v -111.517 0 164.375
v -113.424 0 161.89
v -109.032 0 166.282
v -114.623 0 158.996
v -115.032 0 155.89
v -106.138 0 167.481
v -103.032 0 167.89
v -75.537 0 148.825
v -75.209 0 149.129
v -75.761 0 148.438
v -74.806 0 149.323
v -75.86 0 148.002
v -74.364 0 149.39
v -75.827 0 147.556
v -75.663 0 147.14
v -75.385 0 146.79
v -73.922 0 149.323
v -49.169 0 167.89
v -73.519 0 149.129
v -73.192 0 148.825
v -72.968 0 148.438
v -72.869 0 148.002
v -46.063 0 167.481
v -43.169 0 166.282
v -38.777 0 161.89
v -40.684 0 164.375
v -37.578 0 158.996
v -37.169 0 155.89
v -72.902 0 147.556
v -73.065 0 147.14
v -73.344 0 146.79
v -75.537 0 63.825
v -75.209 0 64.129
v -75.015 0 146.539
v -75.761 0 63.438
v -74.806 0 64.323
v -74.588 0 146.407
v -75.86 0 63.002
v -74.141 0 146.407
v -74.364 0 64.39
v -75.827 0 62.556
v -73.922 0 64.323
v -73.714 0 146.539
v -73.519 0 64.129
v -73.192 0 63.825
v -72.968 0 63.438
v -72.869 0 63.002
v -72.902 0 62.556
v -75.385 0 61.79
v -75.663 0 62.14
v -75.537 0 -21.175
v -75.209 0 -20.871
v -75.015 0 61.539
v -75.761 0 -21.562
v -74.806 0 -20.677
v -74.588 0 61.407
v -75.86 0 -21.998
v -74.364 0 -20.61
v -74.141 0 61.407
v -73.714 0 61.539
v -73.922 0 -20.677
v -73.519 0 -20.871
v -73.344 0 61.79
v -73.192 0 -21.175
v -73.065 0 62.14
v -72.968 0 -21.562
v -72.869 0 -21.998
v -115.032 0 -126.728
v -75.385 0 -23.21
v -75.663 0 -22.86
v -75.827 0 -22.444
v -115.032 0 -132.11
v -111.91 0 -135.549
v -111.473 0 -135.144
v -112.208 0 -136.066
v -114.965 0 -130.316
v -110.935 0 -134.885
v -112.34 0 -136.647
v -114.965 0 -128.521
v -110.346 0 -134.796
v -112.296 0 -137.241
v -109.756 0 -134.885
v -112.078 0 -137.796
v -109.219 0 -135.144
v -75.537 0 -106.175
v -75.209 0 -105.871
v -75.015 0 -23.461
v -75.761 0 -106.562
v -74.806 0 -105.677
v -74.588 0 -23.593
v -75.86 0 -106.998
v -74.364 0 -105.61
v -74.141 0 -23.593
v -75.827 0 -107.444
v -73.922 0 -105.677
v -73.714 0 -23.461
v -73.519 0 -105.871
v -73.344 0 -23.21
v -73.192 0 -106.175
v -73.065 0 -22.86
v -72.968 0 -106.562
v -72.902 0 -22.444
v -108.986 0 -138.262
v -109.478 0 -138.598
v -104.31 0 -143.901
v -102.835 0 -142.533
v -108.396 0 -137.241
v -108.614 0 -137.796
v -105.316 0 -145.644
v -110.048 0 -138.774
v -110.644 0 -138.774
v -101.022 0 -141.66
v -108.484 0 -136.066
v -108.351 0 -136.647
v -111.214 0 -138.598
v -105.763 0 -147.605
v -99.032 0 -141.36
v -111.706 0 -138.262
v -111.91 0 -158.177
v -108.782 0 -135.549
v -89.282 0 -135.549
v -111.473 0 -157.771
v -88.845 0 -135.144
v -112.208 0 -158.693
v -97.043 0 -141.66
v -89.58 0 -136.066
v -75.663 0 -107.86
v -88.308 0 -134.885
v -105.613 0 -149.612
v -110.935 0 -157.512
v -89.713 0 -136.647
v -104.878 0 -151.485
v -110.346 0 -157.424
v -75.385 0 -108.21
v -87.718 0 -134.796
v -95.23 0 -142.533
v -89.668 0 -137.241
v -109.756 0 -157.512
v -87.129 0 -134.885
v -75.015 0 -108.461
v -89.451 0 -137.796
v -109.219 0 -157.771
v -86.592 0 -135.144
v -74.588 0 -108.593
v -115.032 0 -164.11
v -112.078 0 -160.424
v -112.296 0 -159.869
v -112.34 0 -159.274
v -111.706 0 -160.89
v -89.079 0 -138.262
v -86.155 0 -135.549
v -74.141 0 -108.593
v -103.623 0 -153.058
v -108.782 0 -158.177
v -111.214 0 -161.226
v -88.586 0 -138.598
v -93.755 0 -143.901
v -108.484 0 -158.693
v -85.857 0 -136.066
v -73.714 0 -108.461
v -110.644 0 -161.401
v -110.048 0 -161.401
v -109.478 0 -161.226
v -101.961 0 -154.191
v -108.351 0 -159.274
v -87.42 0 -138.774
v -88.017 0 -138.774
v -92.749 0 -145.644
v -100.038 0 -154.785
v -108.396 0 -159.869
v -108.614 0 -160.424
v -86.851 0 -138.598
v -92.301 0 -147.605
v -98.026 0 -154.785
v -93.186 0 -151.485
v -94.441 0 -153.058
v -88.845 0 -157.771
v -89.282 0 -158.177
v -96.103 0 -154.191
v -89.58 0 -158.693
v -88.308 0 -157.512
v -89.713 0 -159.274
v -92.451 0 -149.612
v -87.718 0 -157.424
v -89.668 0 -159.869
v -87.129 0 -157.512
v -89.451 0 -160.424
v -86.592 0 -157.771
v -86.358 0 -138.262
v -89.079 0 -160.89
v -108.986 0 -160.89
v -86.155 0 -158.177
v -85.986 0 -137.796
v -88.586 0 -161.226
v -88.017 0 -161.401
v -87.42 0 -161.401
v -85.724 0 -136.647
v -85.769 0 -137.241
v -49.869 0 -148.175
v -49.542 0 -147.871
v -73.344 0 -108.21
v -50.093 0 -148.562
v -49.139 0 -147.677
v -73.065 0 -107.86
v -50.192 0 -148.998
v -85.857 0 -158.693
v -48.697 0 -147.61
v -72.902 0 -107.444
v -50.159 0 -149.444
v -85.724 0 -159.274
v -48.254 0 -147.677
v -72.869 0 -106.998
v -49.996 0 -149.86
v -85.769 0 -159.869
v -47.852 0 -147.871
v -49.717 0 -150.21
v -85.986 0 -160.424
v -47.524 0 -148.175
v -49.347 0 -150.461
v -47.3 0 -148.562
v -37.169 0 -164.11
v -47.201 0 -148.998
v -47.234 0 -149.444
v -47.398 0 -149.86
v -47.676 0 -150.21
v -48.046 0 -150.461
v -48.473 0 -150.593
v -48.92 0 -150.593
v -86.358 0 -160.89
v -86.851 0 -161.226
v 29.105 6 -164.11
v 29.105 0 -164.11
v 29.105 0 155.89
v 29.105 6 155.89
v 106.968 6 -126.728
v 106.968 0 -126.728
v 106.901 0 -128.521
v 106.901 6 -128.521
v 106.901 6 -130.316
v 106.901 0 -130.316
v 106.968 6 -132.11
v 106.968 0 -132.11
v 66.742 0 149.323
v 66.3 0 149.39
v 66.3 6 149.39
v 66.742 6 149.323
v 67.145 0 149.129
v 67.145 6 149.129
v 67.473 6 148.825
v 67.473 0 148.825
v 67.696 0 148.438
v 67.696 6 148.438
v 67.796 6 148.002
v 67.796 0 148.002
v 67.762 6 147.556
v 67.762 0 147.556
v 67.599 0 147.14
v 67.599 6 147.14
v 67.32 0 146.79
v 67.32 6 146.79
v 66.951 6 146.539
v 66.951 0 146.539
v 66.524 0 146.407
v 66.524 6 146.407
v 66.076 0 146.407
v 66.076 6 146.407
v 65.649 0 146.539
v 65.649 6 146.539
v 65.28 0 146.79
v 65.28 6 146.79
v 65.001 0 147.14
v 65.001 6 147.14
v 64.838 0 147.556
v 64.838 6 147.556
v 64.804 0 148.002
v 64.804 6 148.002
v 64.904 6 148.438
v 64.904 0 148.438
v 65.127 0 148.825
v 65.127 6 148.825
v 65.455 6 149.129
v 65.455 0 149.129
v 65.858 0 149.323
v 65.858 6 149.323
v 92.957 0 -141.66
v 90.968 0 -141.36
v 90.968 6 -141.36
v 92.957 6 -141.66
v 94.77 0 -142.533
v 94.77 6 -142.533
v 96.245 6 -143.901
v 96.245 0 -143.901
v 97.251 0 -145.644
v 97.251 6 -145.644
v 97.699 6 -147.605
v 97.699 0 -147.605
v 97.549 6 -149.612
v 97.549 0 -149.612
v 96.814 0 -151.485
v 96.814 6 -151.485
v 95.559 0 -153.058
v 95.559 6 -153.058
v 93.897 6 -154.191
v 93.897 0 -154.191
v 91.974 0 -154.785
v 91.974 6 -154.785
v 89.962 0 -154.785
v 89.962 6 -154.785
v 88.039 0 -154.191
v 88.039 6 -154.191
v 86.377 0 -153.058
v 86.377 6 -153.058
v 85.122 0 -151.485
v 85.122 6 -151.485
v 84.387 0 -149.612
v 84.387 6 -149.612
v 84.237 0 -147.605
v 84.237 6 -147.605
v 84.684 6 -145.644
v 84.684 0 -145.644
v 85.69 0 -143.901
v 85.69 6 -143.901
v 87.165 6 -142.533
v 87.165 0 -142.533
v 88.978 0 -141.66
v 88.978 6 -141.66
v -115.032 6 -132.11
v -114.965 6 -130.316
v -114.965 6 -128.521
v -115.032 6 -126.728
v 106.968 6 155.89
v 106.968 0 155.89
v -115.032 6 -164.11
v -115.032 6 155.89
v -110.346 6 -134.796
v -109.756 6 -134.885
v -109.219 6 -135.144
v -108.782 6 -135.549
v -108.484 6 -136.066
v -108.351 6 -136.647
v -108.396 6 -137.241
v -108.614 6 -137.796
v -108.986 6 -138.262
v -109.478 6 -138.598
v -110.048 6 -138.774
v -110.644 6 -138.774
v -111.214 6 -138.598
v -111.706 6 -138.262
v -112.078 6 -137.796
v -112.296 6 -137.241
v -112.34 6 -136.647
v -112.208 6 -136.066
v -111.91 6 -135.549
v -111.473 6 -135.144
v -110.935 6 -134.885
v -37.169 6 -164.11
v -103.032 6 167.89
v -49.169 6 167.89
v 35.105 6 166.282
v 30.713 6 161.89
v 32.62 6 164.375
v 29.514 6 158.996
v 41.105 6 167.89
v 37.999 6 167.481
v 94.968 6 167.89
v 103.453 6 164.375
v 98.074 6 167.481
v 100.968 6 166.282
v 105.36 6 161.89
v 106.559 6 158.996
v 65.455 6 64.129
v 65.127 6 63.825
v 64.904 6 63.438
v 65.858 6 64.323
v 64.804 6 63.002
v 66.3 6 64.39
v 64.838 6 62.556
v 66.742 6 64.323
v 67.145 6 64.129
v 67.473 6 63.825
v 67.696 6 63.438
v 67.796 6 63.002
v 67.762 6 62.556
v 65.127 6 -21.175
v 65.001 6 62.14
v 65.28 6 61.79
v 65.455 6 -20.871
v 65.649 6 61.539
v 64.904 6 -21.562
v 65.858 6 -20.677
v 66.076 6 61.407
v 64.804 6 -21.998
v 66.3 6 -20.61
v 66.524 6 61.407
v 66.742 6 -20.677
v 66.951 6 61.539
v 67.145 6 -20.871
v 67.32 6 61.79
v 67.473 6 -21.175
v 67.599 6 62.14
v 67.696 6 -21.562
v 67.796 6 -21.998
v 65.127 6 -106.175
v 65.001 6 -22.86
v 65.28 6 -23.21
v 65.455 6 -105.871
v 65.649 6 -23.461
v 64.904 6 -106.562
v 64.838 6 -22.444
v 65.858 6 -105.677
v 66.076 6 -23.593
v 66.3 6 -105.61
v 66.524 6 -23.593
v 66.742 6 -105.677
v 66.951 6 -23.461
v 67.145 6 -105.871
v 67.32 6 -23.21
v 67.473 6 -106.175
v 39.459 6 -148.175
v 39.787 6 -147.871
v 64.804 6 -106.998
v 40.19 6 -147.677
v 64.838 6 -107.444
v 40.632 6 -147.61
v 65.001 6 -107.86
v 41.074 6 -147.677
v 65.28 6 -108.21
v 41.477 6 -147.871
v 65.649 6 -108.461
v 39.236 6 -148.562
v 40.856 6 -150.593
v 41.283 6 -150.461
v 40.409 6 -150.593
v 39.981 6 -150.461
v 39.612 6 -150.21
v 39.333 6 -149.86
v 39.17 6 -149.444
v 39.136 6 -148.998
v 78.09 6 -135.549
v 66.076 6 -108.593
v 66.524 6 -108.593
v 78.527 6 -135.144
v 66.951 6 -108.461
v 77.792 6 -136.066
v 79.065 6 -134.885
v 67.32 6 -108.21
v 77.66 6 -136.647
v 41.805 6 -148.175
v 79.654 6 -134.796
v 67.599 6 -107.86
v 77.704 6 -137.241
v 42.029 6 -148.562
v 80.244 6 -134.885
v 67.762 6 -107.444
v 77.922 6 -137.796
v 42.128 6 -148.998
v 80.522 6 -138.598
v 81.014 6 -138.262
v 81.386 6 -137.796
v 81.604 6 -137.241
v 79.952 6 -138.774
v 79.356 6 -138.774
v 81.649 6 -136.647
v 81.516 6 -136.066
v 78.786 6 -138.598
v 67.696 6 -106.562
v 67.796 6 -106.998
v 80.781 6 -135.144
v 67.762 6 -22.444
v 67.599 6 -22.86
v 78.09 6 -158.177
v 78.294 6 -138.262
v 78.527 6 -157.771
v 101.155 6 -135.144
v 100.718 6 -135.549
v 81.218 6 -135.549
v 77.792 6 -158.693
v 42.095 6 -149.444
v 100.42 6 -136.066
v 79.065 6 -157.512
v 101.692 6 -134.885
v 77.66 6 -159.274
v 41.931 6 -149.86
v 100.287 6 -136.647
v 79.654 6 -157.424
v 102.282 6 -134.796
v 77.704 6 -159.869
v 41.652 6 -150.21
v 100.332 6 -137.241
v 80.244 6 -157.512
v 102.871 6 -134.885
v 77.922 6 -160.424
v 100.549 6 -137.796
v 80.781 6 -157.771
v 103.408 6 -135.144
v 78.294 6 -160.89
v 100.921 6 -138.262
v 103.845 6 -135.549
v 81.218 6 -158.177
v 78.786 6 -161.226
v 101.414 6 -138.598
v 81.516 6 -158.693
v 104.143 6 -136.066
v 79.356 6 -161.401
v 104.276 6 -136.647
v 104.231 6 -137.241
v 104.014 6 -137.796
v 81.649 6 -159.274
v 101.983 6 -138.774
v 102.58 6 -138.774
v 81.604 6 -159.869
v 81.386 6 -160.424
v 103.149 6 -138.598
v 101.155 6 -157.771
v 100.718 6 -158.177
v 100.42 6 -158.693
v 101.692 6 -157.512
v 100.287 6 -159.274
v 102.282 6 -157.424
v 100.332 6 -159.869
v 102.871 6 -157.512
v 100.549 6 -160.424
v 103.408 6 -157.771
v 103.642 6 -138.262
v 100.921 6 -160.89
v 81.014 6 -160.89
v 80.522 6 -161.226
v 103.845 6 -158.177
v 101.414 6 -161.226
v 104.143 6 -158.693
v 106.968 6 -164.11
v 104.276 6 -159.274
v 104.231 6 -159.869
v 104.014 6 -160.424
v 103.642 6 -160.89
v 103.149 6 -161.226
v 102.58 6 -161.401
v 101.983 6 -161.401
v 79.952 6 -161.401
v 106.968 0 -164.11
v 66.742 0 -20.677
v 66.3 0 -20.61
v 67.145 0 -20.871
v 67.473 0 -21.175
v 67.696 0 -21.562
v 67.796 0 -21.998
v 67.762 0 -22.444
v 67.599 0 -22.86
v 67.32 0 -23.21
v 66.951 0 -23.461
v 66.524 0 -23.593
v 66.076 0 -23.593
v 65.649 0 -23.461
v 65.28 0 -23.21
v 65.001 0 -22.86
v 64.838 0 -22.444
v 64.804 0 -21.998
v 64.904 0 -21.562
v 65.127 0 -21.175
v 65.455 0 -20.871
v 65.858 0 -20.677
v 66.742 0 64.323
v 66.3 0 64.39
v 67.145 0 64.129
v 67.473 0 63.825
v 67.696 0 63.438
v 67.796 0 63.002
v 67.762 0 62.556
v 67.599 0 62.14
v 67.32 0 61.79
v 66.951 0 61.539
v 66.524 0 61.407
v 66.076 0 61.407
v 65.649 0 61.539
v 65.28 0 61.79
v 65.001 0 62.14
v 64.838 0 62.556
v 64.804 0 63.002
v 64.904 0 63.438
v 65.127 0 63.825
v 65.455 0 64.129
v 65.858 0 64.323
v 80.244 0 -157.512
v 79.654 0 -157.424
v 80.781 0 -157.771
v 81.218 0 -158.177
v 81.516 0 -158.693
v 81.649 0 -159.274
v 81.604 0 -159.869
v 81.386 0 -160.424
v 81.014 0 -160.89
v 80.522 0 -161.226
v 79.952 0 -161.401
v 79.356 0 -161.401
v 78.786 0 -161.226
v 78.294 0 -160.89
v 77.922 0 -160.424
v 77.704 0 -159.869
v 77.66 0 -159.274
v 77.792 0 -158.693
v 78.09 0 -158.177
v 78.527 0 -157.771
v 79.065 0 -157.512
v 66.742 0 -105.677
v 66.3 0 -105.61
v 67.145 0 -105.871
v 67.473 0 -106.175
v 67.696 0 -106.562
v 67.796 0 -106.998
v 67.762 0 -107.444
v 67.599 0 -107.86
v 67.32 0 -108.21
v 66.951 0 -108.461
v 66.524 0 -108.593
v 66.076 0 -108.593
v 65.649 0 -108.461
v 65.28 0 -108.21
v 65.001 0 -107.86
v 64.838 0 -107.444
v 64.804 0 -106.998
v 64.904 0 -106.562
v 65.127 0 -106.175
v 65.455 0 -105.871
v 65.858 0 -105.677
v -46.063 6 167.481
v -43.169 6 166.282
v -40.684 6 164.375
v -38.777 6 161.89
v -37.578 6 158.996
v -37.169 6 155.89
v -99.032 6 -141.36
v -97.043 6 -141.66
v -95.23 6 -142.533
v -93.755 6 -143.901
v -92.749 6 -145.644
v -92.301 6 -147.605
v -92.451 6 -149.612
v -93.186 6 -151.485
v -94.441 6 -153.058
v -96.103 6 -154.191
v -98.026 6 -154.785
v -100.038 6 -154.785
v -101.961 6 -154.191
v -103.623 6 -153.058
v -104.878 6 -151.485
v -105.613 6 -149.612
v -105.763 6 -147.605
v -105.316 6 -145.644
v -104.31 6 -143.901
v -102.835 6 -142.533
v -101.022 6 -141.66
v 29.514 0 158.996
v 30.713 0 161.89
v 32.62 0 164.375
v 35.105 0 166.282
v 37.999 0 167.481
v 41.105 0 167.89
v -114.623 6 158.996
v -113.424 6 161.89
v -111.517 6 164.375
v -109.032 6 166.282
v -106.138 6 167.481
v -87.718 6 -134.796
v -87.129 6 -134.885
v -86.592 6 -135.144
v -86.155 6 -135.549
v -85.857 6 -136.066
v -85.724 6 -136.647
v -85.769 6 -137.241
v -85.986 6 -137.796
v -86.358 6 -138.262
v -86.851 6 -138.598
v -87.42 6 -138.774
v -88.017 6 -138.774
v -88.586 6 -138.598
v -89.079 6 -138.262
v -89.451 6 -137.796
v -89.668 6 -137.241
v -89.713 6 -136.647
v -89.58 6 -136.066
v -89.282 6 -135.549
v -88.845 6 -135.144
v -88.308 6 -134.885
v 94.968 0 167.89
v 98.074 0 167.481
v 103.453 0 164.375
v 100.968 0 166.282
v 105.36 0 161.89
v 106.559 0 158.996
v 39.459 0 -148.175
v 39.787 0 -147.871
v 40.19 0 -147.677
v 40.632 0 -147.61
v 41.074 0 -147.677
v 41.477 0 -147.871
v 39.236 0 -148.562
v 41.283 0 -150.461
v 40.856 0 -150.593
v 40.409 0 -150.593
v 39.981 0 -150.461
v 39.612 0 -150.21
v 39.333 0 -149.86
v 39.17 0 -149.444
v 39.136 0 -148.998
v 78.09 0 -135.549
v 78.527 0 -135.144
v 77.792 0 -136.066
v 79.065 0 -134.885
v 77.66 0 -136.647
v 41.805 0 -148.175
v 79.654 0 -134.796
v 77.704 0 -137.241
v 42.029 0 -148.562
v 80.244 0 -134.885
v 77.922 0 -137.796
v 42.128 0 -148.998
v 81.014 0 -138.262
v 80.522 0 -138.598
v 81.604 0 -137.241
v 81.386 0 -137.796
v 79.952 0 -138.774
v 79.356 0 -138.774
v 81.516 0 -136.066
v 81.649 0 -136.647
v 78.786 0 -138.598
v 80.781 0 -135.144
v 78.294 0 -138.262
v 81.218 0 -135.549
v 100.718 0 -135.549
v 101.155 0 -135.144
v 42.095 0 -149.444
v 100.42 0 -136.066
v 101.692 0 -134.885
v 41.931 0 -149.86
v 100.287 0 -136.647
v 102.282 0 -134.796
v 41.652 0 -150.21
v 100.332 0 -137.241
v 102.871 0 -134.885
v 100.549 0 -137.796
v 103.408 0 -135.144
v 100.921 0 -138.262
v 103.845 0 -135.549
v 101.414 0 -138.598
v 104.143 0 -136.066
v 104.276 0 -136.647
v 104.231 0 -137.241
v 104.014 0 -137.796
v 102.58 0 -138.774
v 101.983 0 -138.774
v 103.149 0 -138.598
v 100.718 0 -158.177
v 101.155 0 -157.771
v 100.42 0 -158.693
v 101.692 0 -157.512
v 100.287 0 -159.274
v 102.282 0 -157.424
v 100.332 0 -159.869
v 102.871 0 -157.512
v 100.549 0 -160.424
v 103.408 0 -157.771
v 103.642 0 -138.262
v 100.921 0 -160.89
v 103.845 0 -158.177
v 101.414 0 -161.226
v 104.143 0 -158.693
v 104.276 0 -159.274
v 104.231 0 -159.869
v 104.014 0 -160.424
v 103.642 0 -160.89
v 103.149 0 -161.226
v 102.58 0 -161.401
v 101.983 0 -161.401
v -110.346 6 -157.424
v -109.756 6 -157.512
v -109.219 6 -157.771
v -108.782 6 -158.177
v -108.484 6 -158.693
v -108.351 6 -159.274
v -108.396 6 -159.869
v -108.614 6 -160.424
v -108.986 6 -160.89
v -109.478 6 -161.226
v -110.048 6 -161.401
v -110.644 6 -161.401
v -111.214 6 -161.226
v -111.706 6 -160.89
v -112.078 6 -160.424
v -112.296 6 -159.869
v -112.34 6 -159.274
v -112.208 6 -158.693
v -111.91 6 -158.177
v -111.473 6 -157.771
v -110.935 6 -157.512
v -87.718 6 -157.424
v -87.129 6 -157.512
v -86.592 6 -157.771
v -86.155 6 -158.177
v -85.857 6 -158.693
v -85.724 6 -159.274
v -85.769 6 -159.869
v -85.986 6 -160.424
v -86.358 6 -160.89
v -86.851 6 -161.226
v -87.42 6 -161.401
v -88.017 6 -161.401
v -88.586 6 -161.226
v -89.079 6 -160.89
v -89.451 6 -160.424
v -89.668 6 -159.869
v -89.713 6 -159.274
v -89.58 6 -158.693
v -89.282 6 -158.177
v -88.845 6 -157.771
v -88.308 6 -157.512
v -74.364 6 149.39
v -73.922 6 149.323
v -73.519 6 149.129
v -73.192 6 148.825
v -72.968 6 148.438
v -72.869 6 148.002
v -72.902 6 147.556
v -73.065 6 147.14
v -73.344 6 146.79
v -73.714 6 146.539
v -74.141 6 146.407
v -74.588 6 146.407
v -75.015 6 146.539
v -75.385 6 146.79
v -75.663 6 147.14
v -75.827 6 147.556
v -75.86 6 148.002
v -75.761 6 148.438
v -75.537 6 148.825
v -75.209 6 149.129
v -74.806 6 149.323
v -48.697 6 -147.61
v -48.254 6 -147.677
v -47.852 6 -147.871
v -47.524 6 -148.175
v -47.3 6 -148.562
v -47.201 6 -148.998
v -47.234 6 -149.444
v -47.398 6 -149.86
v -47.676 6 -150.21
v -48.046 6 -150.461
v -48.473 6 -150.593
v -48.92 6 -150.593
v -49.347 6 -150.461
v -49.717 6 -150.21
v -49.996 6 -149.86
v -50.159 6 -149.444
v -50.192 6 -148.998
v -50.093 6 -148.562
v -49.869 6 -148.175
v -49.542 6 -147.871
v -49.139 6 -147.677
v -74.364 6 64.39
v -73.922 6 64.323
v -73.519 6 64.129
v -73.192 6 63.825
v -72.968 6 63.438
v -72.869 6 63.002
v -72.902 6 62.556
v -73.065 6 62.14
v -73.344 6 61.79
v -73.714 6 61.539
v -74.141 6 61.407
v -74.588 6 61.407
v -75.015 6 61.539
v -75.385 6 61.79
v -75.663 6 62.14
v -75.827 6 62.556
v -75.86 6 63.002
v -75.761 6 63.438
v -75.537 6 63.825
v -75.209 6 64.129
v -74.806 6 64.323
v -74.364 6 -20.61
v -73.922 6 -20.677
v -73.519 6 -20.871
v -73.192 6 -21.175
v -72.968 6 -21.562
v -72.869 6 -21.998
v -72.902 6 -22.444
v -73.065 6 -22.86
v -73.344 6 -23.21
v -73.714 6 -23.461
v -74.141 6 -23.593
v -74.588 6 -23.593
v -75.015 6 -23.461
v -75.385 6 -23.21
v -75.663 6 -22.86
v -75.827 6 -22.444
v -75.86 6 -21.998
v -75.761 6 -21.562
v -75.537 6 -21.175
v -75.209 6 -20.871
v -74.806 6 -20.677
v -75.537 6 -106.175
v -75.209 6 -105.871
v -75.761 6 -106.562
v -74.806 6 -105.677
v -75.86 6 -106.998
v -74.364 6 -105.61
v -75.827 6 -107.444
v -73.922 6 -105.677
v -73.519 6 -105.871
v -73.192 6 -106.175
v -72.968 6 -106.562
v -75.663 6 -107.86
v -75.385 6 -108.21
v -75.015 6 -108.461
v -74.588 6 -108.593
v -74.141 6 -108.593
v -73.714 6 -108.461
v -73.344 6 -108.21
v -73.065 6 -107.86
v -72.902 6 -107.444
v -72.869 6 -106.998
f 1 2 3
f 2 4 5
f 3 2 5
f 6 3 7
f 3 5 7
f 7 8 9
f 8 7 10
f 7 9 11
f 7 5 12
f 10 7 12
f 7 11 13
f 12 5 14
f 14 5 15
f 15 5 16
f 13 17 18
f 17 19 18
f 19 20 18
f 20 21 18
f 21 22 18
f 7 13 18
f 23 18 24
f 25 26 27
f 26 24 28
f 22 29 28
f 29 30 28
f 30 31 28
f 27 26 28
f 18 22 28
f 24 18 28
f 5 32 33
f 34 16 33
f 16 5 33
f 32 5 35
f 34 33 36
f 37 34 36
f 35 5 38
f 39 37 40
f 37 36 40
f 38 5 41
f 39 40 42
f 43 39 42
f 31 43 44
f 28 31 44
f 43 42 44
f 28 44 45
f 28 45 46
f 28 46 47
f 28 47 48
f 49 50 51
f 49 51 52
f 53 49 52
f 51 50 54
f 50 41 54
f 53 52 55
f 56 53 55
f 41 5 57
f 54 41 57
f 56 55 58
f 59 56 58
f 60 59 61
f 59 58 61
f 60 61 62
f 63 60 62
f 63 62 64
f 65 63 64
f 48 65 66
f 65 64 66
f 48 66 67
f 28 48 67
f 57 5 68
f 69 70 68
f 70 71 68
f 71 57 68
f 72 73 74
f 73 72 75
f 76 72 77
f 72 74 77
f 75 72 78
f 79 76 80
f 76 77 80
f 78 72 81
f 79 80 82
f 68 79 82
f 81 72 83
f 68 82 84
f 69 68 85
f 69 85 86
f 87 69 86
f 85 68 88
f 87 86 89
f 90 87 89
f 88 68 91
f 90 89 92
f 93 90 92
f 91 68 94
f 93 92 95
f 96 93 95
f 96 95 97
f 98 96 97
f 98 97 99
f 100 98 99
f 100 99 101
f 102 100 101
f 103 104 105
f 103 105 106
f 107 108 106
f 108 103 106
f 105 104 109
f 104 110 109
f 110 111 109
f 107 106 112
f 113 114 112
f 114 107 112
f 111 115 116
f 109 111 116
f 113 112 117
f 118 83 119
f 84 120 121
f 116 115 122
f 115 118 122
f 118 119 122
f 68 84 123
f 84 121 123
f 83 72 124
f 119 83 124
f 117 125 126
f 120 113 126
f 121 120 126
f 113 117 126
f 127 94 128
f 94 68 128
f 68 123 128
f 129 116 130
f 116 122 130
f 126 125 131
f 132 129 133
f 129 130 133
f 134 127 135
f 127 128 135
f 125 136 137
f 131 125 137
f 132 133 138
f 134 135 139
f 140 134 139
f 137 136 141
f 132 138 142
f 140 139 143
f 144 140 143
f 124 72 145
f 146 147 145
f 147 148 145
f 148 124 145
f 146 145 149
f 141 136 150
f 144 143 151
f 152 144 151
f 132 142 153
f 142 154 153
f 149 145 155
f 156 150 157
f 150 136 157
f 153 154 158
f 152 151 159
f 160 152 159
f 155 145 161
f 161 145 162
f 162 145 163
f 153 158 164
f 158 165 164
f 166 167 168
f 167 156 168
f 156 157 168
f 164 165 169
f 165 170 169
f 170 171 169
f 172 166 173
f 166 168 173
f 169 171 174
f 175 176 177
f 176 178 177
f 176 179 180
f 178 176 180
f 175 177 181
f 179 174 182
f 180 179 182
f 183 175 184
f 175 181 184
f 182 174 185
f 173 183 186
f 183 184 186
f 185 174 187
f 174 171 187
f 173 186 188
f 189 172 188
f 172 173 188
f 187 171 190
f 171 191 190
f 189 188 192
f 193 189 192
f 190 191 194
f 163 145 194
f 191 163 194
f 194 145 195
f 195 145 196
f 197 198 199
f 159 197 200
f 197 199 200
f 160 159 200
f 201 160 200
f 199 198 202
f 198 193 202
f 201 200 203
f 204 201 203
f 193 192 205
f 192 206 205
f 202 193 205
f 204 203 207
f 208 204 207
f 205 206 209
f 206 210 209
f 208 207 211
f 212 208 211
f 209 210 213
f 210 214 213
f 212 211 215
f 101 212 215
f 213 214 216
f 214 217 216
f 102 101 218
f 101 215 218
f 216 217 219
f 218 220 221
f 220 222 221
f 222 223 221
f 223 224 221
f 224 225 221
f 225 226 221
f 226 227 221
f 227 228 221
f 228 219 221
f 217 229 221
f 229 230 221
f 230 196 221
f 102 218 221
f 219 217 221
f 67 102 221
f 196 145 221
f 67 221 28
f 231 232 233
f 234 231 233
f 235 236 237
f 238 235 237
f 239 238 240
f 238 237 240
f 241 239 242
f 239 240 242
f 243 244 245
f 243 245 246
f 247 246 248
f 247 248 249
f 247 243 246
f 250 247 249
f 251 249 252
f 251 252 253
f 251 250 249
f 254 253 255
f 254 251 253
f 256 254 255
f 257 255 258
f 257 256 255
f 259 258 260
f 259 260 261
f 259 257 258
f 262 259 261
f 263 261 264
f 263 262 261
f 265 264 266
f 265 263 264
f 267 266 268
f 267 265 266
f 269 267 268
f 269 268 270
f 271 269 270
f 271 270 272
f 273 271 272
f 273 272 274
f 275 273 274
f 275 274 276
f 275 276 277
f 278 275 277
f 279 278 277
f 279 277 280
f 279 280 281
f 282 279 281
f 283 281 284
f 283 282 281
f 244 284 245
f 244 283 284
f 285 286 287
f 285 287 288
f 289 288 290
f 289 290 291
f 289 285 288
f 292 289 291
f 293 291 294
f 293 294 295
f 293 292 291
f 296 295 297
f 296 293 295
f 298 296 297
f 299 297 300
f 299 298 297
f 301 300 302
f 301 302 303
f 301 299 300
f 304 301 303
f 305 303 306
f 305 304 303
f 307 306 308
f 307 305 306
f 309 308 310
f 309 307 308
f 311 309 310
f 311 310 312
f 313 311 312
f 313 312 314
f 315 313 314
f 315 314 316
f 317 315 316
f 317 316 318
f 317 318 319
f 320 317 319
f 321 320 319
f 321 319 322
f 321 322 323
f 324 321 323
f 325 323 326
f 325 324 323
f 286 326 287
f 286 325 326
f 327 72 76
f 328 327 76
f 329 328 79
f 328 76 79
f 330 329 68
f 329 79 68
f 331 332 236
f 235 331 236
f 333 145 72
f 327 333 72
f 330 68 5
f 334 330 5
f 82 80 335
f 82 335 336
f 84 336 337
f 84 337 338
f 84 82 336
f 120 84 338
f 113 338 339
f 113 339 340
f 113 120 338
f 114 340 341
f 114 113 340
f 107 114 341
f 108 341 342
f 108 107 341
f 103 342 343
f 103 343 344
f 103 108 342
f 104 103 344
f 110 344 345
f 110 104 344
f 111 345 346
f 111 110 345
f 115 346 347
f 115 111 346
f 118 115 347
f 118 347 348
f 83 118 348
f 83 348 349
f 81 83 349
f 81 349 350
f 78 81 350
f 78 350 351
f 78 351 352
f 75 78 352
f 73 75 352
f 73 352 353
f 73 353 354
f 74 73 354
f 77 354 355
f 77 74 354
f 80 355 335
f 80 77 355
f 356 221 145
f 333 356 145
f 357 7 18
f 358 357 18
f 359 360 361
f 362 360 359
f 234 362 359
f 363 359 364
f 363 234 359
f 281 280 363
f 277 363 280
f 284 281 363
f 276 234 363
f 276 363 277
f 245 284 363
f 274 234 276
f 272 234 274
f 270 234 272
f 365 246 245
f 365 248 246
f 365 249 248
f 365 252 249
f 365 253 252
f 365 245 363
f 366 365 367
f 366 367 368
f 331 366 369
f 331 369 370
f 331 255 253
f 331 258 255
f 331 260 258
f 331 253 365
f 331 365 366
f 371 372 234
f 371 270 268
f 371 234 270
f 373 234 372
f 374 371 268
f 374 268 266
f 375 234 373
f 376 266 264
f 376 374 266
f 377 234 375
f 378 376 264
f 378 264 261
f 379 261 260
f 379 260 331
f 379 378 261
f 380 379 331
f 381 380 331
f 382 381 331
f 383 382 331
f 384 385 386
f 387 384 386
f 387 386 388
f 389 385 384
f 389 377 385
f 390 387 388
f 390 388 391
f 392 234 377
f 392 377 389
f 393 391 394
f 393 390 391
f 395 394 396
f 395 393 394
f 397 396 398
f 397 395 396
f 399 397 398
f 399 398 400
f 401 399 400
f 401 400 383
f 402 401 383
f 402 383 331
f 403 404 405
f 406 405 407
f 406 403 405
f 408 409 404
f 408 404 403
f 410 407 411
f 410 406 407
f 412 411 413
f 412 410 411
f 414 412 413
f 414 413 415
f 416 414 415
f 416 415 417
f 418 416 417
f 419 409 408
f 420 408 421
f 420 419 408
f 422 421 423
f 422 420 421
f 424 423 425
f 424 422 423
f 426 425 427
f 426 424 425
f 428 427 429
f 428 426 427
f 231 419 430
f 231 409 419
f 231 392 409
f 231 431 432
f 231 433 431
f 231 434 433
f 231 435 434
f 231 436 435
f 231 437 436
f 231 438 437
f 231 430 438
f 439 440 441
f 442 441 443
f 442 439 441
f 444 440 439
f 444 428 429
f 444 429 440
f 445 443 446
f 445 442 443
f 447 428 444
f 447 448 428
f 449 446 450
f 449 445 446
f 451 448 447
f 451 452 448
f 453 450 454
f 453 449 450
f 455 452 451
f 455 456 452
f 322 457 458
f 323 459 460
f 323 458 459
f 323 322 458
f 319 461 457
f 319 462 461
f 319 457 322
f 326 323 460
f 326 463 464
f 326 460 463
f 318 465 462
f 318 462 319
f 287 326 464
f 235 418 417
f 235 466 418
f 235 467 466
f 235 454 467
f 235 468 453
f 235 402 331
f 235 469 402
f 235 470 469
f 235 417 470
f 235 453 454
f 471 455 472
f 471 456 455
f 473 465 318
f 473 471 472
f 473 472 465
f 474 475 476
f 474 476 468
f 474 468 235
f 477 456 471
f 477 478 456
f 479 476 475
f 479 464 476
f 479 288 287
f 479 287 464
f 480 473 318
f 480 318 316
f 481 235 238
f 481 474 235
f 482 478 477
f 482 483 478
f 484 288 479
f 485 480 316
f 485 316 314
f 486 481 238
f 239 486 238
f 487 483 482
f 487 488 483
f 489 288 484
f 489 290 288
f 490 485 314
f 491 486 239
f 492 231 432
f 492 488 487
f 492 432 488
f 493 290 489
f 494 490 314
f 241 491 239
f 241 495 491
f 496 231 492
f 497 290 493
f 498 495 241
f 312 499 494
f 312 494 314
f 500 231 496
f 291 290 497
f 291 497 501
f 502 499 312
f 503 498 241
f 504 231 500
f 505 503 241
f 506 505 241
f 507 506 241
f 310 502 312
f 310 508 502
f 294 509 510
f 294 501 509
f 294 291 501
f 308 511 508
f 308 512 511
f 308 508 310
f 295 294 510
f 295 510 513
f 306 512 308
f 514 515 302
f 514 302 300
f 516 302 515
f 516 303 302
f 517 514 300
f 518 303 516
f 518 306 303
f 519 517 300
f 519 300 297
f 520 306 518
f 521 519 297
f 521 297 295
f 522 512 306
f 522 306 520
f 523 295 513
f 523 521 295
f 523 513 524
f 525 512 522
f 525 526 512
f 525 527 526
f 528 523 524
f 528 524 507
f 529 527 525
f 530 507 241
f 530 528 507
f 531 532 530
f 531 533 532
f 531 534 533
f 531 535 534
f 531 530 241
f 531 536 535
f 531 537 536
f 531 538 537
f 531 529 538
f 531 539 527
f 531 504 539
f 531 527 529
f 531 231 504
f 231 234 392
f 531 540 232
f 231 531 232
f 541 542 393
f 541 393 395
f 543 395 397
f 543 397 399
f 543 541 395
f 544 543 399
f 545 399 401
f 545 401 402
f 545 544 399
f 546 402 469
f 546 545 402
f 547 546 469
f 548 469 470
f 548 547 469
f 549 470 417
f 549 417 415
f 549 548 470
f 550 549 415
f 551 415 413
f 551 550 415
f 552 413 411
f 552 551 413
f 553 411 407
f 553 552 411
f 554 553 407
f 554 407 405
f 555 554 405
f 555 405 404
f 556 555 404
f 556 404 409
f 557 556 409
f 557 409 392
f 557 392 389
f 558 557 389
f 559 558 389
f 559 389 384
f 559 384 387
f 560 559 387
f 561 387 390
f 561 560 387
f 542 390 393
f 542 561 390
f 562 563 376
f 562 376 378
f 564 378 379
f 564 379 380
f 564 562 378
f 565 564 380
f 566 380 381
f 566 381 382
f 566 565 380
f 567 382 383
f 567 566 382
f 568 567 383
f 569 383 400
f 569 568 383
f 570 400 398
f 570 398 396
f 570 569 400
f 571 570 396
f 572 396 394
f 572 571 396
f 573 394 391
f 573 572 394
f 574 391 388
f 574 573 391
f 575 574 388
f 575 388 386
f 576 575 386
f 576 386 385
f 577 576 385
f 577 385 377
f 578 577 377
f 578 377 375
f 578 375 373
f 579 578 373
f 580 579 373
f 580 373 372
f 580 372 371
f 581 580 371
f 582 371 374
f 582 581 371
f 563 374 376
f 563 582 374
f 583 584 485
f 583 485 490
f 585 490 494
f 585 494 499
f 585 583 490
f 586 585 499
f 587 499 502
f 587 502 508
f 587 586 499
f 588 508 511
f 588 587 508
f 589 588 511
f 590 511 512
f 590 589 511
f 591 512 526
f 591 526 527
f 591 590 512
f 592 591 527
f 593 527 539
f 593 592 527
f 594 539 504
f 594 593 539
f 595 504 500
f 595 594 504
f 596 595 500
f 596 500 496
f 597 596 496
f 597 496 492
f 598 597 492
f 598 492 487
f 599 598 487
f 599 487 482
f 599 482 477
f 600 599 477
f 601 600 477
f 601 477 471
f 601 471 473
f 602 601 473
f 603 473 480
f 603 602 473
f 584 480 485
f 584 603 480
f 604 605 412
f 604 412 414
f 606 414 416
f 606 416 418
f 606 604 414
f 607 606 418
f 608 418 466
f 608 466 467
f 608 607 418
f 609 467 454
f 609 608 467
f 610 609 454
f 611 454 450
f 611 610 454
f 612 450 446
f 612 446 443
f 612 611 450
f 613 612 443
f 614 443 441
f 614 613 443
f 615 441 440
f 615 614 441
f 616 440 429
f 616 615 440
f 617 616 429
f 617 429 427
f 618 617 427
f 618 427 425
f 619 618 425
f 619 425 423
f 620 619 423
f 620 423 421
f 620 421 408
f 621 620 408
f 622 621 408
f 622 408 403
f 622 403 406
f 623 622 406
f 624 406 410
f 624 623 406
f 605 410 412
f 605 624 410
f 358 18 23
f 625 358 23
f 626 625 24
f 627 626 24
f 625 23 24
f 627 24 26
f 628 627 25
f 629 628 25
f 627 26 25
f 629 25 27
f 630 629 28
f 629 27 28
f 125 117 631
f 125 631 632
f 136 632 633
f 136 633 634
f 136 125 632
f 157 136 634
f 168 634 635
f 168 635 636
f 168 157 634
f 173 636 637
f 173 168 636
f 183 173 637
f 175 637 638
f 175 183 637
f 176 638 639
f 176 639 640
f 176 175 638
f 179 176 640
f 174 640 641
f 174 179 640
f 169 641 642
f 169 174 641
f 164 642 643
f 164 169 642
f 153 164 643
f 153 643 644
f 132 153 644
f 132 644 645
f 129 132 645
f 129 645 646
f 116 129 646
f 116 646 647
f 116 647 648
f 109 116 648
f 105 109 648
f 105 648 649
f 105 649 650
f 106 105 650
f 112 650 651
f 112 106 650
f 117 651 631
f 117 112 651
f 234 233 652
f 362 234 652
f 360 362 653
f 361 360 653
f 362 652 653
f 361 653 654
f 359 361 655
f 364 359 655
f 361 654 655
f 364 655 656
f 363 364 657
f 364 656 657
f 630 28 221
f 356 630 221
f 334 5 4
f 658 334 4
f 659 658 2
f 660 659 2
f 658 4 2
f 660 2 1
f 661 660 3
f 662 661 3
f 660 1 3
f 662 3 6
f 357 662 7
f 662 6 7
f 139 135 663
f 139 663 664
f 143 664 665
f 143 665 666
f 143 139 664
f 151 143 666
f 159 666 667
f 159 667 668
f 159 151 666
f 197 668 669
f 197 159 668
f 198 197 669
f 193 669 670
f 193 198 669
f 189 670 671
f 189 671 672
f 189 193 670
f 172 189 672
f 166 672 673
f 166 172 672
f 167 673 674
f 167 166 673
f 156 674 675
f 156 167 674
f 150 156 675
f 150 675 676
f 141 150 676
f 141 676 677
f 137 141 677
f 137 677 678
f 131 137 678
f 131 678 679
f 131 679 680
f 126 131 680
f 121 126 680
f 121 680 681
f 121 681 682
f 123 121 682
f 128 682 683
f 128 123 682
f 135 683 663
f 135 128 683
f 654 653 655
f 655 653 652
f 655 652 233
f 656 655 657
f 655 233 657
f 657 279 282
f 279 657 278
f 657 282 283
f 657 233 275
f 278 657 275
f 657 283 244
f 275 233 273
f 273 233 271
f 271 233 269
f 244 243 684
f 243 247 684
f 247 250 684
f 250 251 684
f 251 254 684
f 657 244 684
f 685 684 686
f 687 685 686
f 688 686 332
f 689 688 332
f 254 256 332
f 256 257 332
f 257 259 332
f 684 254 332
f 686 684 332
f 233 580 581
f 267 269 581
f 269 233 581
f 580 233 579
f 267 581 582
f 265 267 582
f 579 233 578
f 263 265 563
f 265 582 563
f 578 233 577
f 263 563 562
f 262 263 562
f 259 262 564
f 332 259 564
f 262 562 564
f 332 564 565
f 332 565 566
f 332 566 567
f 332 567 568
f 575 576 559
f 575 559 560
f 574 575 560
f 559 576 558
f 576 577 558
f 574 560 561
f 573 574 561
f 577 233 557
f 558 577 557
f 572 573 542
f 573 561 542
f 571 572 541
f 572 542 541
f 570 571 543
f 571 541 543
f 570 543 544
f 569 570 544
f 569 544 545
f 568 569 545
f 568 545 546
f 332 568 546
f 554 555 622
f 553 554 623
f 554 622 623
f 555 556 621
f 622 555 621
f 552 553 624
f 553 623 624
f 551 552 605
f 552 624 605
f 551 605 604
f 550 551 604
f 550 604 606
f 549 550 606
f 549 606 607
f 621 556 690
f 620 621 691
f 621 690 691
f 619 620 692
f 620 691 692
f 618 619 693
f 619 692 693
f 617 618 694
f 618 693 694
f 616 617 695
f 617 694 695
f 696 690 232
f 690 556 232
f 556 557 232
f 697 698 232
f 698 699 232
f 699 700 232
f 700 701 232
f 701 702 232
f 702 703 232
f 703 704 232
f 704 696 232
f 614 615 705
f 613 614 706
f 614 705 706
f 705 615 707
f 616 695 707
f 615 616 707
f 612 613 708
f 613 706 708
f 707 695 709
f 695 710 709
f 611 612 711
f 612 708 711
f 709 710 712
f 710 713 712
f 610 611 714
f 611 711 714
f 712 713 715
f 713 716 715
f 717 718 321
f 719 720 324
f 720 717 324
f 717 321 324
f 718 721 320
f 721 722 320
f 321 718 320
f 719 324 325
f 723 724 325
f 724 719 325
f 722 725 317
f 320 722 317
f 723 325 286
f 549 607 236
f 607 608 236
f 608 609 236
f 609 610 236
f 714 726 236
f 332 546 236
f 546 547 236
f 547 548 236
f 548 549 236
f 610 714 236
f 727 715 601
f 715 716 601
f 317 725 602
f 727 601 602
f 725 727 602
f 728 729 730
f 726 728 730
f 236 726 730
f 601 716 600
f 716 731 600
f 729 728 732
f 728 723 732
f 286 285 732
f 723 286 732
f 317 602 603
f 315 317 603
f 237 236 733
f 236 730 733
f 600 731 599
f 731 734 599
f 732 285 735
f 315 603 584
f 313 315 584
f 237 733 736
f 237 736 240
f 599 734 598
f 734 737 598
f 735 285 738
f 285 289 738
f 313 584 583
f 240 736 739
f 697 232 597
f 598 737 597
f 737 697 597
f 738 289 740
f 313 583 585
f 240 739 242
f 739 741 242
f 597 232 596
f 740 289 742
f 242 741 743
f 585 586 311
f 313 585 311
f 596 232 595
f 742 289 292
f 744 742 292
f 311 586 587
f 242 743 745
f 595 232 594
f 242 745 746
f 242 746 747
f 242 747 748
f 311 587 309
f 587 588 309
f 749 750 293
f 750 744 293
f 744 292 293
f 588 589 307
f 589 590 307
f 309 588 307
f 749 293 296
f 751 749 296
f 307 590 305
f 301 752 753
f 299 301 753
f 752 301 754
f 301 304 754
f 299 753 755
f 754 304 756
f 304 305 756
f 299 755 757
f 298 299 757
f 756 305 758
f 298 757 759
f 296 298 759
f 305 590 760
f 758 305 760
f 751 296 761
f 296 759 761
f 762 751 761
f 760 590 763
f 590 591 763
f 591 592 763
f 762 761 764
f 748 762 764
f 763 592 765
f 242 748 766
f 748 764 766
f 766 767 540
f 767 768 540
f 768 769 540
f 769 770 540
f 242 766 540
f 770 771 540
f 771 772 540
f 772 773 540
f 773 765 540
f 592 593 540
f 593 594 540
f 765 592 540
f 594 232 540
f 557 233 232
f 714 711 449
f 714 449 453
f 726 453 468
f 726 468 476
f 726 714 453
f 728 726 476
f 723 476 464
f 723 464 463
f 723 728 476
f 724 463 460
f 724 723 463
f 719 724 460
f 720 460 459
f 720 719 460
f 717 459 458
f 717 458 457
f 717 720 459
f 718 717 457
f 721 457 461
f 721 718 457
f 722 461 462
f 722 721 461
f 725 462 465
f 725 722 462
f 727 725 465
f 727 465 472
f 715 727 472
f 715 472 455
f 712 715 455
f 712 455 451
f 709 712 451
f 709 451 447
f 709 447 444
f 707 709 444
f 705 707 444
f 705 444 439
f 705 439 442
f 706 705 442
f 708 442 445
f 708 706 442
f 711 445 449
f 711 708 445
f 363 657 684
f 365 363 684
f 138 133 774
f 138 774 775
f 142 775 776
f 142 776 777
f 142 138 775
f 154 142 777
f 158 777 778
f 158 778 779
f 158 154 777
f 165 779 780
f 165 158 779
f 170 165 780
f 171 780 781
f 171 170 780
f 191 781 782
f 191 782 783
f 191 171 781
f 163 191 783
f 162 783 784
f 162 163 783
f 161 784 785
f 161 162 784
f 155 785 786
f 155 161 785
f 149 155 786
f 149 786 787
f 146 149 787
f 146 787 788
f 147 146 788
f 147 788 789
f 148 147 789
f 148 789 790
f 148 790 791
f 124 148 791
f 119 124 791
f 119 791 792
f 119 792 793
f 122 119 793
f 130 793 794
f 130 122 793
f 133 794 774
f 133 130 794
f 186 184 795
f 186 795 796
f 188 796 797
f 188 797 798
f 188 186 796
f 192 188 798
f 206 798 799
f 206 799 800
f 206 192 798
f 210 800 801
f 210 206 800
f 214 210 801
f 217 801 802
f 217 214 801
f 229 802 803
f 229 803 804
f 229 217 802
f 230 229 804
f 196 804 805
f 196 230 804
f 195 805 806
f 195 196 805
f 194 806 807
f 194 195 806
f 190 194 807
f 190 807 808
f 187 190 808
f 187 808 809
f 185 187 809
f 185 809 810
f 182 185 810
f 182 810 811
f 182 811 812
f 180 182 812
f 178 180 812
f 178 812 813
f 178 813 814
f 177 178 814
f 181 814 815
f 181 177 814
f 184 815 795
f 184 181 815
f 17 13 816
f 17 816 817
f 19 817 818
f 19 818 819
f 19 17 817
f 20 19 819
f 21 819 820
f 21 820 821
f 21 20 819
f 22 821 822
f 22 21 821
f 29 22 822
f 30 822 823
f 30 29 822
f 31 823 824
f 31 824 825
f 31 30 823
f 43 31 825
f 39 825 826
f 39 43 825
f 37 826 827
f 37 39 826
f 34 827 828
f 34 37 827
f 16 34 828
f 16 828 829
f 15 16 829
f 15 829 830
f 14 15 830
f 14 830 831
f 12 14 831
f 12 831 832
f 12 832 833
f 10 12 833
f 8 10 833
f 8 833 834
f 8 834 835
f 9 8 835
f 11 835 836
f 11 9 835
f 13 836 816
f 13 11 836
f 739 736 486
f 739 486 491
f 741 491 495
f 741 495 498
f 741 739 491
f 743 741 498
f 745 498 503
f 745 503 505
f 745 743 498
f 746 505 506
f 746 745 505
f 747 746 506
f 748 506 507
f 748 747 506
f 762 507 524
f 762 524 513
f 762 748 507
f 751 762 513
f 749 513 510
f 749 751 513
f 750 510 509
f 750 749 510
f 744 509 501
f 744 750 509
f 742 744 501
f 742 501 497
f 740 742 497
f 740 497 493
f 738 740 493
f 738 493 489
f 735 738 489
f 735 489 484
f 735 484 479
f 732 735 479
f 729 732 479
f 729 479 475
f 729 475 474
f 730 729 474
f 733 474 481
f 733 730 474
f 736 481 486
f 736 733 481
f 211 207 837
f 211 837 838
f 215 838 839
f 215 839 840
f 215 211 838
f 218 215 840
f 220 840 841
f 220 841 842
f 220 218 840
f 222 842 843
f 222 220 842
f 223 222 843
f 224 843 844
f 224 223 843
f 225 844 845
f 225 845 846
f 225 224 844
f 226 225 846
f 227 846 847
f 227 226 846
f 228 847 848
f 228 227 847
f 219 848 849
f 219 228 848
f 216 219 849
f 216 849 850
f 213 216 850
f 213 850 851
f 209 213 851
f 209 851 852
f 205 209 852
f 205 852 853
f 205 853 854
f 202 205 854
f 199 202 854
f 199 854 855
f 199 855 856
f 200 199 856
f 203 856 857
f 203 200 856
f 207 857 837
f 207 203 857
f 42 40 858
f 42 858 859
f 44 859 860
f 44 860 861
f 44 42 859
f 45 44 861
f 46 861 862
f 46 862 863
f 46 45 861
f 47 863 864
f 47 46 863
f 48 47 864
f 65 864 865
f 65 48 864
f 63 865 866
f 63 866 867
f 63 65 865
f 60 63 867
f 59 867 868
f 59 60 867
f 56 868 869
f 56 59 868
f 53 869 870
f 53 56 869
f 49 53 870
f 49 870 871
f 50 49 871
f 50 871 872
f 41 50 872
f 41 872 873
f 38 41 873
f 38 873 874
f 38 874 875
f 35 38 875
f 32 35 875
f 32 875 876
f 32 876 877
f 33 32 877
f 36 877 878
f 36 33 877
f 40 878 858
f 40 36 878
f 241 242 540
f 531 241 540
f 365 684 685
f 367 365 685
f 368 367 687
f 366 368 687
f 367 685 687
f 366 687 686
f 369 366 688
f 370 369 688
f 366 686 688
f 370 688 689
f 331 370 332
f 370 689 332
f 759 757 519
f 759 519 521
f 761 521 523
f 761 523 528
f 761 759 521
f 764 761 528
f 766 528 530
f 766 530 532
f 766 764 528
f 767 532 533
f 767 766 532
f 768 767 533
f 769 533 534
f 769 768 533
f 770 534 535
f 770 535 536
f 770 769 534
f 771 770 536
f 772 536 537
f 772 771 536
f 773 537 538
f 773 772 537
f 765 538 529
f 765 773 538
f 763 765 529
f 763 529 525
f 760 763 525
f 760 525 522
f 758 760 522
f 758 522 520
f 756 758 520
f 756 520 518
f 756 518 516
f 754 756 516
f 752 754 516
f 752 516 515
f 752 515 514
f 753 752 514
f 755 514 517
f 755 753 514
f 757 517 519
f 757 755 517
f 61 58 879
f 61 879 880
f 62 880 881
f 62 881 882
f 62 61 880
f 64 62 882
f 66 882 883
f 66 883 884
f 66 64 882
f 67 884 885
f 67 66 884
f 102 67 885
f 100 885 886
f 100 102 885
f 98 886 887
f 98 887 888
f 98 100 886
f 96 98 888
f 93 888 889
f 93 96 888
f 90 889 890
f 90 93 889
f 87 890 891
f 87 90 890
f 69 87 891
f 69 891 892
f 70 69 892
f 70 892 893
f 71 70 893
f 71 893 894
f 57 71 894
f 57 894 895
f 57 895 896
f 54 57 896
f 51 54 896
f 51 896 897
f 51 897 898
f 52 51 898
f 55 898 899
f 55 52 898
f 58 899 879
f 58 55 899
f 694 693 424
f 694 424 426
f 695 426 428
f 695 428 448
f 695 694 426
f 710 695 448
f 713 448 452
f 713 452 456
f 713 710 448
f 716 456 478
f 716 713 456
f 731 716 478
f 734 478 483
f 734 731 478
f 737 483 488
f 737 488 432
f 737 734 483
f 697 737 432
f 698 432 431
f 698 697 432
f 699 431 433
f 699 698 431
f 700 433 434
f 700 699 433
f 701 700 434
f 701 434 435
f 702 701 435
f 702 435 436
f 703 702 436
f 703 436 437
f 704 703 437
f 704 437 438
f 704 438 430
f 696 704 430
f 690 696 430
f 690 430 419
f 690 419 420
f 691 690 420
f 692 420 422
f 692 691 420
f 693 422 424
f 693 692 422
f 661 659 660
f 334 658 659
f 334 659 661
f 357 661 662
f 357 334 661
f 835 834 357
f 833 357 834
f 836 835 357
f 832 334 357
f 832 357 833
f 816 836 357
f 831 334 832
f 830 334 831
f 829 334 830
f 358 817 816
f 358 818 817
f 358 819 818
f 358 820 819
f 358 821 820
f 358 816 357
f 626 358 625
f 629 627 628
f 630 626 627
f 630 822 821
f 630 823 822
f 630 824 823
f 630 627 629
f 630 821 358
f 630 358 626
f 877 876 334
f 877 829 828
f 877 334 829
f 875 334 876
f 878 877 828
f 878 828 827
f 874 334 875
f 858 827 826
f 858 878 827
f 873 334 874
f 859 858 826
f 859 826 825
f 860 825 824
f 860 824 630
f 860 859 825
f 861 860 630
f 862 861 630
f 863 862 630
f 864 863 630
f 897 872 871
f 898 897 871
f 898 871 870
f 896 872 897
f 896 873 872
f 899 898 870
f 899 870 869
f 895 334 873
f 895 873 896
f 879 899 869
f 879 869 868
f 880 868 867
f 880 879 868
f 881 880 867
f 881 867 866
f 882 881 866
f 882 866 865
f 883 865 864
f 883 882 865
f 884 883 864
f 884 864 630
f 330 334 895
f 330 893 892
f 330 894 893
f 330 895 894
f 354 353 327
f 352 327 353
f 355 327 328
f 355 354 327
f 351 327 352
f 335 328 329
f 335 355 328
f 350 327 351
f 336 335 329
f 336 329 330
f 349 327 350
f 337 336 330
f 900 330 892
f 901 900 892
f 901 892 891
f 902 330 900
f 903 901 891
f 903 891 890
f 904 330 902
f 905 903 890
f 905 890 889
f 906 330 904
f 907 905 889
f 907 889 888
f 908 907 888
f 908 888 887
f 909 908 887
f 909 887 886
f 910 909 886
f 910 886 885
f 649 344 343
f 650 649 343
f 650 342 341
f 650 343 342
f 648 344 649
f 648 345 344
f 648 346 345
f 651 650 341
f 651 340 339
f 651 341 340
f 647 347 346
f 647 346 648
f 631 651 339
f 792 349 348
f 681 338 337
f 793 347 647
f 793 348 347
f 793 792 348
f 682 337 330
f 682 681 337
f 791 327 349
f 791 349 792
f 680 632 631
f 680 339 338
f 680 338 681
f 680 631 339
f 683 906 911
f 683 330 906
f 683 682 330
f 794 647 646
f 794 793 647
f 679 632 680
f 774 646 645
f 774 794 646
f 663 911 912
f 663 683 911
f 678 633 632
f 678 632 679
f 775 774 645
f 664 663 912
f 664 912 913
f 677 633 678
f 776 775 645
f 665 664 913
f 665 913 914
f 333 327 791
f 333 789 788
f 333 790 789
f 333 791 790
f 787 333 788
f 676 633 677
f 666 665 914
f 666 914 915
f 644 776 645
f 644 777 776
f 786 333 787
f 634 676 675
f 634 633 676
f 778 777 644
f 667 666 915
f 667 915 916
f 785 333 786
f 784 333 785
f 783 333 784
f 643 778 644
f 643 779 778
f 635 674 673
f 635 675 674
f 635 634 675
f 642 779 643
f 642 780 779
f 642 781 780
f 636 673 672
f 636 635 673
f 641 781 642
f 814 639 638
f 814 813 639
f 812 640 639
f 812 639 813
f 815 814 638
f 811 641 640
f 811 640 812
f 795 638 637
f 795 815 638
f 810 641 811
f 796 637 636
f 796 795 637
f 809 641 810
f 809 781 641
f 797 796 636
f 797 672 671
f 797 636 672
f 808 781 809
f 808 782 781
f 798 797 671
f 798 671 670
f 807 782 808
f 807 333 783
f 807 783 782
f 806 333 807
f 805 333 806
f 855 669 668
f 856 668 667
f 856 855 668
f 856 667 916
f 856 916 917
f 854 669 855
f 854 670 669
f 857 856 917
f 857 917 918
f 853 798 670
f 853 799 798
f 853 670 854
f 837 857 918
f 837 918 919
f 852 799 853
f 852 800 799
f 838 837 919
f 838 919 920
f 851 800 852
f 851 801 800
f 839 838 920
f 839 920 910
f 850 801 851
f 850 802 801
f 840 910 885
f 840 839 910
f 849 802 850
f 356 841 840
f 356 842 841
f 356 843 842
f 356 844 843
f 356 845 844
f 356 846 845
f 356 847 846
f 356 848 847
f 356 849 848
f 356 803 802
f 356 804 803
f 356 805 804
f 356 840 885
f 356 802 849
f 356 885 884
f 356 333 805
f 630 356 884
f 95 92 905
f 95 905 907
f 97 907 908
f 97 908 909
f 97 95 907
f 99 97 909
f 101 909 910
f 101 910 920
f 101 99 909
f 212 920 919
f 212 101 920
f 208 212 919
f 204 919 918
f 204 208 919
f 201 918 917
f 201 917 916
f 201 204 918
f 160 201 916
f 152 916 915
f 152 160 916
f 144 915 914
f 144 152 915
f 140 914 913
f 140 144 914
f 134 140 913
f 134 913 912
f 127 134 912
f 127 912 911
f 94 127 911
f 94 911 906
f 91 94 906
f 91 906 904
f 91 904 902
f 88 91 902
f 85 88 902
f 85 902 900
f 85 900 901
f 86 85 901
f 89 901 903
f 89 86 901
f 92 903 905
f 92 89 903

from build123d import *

# Parameters (mm, degrees)
CROQUIS1_R                = 1.5
CROQUIS1_R_2              = 2
CROQUIS1_R_3              = 6.75
SALIENTE_EXTRUIR1_DEPTH   = 6
SALIENTE_EXTRUIR1_2_DEPTH = 6


with BuildPart() as part:
    # Croquis1 → Saliente-Extruir1 (new body)
    with BuildSketch(Plane(origin=(0, 0, 0), x_dir=(1, 0, 0), z_dir=(0, 1, 0))):
        with BuildLine():
            Line((106.967839575, 132.109924801), (106.967839575, 164.109924801))
            Line((106.967839575, 164.109924801), (29.104968861, 164.109924801))
            Line((29.104968861, 164.109924801), (29.104968861, -155.890075199))
            ThreePointArc((29.104968861, -155.890075199), (32.619687487, -164.375356573), (41.104968861, -167.890075199))
            Line((41.104968861, -167.890075199), (94.967839575, -167.890075199))
            ThreePointArc((94.967839575, -167.890075199), (103.45312095, -164.375356573), (106.967839575, -155.890075199))
            Line((106.967839575, -155.890075199), (106.967839575, 126.727593434))
            ThreePointArc((106.967839575, 126.727593434), (106.892367598, 129.418759117), (106.967839575, 132.109924801))
        make_face()
        with Locations(Location((66.300038828, -147.890075199, 0), (0, 0, 270))):
            Circle(CROQUIS1_R, mode=Mode.SUBTRACT)
        with Locations(Location((66.300038828, -62.890075199, 0), (0, 0, 270))):
            Circle(CROQUIS1_R, mode=Mode.SUBTRACT)
        with Locations(Location((66.300038828, 22.109924801, 0), (0, 0, 270))):
            Circle(CROQUIS1_R, mode=Mode.SUBTRACT)
        with Locations(Location((40.63223808, 149.109924801, 0), (0, 0, 270))):
            Circle(CROQUIS1_R, mode=Mode.SUBTRACT)
        with Locations(Location((66.300038828, 107.109924801, 0), (0, 0, 270))):
            Circle(CROQUIS1_R, mode=Mode.SUBTRACT)
        with Locations(Location((79.654131076, 136.796216302, 0), (0, 0, 270))):
            Circle(CROQUIS1_R_2, mode=Mode.SUBTRACT)
        with Locations(Location((102.281548074, 136.796216302, 0), (0, 0, 270))):
            Circle(CROQUIS1_R_2, mode=Mode.SUBTRACT)
        with Locations(Location((90.967839575, 148.109924801, 0), (0, 0, 270))):
            Circle(CROQUIS1_R_3, mode=Mode.SUBTRACT)
        with Locations(Location((79.654131076, 159.4236333, 0), (0, 0, 270))):
            Circle(CROQUIS1_R_2, mode=Mode.SUBTRACT)
        with Locations(Location((102.281548074, 159.4236333, 0), (0, 0, 270))):
            Circle(CROQUIS1_R_2, mode=Mode.SUBTRACT)
    extrude(amount=SALIENTE_EXTRUIR1_DEPTH)


with BuildPart() as body_2:
    # Croquis1 → Saliente-Extruir1 2 (new body)
    with BuildSketch(Plane(origin=(0, 0, 0), x_dir=(1, 0, 0), z_dir=(0, 1, 0))):
        with BuildLine():
            Line((-37.16928971, 164.109924801), (-115.032160425, 164.109924801))
            Line((-115.032160425, 164.109924801), (-115.032160425, 132.109924801))
            ThreePointArc((-115.032160425, 132.109924801), (-114.956688447, 129.418759117), (-115.032160425, 126.727593433))
            Line((-115.032160425, 126.727593433), (-115.032160425, -155.890075199))
            ThreePointArc((-115.032160425, -155.890075199), (-111.517441799, -164.375356573), (-103.032160425, -167.890075199))
            Line((-103.032160425, -167.890075199), (-49.16928971, -167.890075199))
            ThreePointArc((-49.16928971, -167.890075199), (-40.684008336, -164.375356573), (-37.16928971, -155.890075199))
            Line((-37.16928971, -155.890075199), (-37.16928971, 164.109924801))
        make_face()
        with Locations(Location((-74.364359677, -147.890075199, 0), (0, 0, 270))):
            Circle(CROQUIS1_R, mode=Mode.SUBTRACT)
        with Locations(Location((-74.364359677, -62.890075199, 0), (0, 0, 270))):
            Circle(CROQUIS1_R, mode=Mode.SUBTRACT)
        with Locations(Location((-74.364359677, 22.109924801, 0), (0, 0, 270))):
            Circle(CROQUIS1_R, mode=Mode.SUBTRACT)
        with Locations(Location((-74.364359677, 107.109924801, 0), (0, 0, 270))):
            Circle(CROQUIS1_R, mode=Mode.SUBTRACT)
        with Locations(Location((-110.345868924, 136.796216302, 0), (0, 0, 270))):
            Circle(CROQUIS1_R_2, mode=Mode.SUBTRACT)
        with Locations(Location((-87.718451926, 136.796216302, 0), (0, 0, 270))):
            Circle(CROQUIS1_R_2, mode=Mode.SUBTRACT)
        with Locations(Location((-110.345868924, 159.4236333, 0), (0, 0, 270))):
            Circle(CROQUIS1_R_2, mode=Mode.SUBTRACT)
        with Locations(Location((-99.032160425, 148.109924801, 0), (0, 0, 270))):
            Circle(CROQUIS1_R_3, mode=Mode.SUBTRACT)
        with Locations(Location((-87.718451926, 159.4236333, 0), (0, 0, 270))):
            Circle(CROQUIS1_R_2, mode=Mode.SUBTRACT)
        with Locations(Location((-48.696558929, 149.109924801, 0), (0, 0, 270))):
            Circle(CROQUIS1_R, mode=Mode.SUBTRACT)
    extrude(amount=SALIENTE_EXTRUIR1_2_DEPTH)


solid = Compound([part.part, body_2.part])
